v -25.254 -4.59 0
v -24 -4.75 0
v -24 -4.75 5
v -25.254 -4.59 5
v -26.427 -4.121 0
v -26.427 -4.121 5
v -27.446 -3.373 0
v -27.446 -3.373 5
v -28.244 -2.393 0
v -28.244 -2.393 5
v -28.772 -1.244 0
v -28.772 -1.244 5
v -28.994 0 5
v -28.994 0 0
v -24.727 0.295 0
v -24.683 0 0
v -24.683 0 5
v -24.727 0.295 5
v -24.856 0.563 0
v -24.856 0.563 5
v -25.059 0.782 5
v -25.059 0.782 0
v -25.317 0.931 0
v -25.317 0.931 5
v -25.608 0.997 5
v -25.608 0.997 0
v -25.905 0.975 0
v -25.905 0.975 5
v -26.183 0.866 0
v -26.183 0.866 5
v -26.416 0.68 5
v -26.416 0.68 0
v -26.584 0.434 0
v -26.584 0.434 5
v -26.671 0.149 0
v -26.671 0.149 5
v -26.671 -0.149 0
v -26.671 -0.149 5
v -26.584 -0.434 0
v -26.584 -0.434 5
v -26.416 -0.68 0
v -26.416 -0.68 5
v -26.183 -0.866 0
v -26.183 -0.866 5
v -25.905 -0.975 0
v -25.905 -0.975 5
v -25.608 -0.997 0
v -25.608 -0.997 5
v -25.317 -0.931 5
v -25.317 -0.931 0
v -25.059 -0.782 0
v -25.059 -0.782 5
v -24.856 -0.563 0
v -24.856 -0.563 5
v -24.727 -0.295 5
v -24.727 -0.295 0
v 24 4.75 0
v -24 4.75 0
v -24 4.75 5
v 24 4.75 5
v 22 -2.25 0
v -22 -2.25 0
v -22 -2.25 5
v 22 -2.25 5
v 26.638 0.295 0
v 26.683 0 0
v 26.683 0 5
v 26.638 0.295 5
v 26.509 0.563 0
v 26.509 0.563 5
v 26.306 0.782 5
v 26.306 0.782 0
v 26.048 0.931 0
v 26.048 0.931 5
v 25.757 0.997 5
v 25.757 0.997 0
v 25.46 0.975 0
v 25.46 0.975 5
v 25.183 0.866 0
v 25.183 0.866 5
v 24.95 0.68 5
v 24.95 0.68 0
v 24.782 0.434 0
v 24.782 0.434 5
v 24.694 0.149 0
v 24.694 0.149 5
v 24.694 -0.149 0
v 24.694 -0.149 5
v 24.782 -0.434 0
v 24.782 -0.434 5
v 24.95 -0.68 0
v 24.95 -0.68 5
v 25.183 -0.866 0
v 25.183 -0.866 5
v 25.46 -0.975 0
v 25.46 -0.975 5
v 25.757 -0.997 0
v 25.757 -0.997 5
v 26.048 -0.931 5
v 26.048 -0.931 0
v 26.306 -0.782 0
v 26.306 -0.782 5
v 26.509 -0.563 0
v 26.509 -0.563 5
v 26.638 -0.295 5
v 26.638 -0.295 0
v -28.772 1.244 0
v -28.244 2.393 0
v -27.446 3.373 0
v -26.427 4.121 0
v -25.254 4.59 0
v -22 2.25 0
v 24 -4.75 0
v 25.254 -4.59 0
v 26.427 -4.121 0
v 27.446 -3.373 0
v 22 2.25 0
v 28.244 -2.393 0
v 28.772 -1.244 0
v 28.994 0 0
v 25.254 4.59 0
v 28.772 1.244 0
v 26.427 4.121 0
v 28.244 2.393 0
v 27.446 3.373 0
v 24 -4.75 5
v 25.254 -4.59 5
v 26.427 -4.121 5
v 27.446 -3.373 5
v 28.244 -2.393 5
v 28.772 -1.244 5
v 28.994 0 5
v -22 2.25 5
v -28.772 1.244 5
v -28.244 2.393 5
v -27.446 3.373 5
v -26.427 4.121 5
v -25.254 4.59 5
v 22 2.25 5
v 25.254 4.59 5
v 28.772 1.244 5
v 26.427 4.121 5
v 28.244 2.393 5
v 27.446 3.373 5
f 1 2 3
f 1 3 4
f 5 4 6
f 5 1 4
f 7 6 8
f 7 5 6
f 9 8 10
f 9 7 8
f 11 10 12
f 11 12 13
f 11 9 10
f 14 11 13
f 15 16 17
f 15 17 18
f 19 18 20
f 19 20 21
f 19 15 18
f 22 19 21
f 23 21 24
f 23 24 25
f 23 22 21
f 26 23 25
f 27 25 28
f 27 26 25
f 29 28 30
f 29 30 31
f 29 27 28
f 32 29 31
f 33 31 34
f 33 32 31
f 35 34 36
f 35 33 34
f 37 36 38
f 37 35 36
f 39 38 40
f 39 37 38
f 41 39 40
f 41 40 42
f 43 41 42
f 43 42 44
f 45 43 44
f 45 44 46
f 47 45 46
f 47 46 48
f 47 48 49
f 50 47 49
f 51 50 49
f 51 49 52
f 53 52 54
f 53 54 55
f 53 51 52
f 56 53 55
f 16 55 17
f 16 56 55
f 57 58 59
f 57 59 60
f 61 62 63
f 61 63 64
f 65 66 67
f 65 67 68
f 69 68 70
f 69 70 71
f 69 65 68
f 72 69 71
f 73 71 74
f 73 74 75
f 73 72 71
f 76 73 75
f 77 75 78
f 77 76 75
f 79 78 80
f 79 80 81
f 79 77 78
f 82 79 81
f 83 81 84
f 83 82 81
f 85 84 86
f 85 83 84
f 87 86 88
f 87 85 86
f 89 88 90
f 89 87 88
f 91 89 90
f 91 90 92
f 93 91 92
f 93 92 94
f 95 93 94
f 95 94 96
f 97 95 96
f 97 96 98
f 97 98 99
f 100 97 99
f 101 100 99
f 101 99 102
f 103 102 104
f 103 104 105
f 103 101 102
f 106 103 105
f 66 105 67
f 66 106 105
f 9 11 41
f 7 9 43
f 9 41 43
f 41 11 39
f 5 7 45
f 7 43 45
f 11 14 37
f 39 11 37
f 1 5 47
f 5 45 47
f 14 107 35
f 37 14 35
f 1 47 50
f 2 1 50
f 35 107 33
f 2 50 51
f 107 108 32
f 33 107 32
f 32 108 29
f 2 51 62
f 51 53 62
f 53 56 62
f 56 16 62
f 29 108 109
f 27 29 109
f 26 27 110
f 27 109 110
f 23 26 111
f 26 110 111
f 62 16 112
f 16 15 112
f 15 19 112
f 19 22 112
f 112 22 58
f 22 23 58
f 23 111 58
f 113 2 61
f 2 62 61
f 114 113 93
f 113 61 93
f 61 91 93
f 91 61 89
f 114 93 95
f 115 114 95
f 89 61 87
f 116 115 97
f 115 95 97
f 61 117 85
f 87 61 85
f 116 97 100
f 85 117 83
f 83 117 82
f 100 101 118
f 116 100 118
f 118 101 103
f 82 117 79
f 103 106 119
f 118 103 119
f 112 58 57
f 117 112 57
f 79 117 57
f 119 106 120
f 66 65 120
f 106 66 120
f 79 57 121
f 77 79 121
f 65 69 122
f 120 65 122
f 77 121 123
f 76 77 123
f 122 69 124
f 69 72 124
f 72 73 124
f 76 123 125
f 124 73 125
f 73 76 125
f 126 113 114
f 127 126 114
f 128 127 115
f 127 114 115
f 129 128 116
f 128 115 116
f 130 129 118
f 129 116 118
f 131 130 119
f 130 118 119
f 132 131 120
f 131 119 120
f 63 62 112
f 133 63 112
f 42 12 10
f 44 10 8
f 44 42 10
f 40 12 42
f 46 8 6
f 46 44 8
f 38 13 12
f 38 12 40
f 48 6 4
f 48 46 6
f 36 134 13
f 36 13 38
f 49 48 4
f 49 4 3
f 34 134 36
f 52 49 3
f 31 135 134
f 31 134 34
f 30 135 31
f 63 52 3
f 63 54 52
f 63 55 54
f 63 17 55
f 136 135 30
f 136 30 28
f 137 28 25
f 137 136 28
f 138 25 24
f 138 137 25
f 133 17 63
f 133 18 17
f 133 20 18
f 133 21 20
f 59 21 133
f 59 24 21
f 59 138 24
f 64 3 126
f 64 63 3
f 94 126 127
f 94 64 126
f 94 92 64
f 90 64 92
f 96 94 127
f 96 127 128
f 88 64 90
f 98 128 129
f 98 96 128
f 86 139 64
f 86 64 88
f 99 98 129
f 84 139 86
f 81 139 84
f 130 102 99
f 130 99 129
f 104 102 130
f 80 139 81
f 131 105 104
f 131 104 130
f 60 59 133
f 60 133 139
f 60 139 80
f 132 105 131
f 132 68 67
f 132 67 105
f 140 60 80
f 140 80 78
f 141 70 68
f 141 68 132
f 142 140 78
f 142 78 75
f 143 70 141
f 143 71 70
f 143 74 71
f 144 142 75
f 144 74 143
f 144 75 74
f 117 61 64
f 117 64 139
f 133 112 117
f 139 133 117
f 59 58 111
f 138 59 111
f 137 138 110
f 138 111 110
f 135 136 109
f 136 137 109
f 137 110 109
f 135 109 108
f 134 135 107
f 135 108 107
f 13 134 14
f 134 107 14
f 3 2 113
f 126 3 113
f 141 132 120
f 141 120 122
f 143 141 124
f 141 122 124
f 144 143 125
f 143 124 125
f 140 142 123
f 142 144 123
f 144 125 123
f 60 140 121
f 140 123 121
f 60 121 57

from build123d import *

# Parameters (mm, degrees)
F0_W        = 58
F0_H        = 9.5
F0_R        = 1
F0_W_2      = 44
F0_H_2      = 4.5
F1_DEPTH    = 5
F2_T1_DEPTH = 30


# Not quite as in the source:
# - a fillet or chamfer that OpenCascade refuses, or shapes differently, is made with other operations: its cross-section is extruded or revolved along the edge and cut away or added


with BuildPart() as f1:
    # F0 (on Top) → F1 (new body)
    with BuildSketch(Plane.XY):
        Rectangle(F0_W, F0_H)
        with Locations((-25.6825946271, 0)):
            Circle(F0_R, mode=Mode.SUBTRACT)
        Rectangle(F0_W_2, F0_H_2, mode=Mode.SUBTRACT)
        with Locations((25.6825946271, 0)):
            Circle(F0_R, mode=Mode.SUBTRACT)
    extrude(amount=F1_DEPTH)

    # F2: fillet of radius 5 on 4 edges, made by hand

    # F2_s2 → F2_t1 (cut)
    with BuildSketch(Plane.XY.offset(-12.5)):
        with BuildLine():
            ThreePointArc((24, -4.75), (27.5355339059, -3.2855339059), (29, 0.25))
            Line((29, 0.25), (29, -4.75))
            Line((29, -4.75), (24, -4.75))
        make_face()
        with BuildLine():
            ThreePointArc((29, -0.25), (27.5355339059, 3.2855339059), (24, 4.75))
            Line((24, 4.75), (29, 4.75))
            Line((29, 4.75), (29, -0.25))
        make_face()
        with BuildLine():
            ThreePointArc((-24, 4.75), (-27.5355339059, 3.2855339059), (-29, -0.25))
            Line((-29, -0.25), (-29, 4.75))
            Line((-29, 4.75), (-24, 4.75))
        make_face()
        with BuildLine():
            ThreePointArc((-24, -4.75), (-27.5355339059, -3.2855339059), (-29, 0.25))
            Line((-29, 0.25), (-29, -4.75))
            Line((-29, -4.75), (-24, -4.75))
        make_face()
    extrude(amount=F2_T1_DEPTH, mode=Mode.SUBTRACT)


solid = f1.part
